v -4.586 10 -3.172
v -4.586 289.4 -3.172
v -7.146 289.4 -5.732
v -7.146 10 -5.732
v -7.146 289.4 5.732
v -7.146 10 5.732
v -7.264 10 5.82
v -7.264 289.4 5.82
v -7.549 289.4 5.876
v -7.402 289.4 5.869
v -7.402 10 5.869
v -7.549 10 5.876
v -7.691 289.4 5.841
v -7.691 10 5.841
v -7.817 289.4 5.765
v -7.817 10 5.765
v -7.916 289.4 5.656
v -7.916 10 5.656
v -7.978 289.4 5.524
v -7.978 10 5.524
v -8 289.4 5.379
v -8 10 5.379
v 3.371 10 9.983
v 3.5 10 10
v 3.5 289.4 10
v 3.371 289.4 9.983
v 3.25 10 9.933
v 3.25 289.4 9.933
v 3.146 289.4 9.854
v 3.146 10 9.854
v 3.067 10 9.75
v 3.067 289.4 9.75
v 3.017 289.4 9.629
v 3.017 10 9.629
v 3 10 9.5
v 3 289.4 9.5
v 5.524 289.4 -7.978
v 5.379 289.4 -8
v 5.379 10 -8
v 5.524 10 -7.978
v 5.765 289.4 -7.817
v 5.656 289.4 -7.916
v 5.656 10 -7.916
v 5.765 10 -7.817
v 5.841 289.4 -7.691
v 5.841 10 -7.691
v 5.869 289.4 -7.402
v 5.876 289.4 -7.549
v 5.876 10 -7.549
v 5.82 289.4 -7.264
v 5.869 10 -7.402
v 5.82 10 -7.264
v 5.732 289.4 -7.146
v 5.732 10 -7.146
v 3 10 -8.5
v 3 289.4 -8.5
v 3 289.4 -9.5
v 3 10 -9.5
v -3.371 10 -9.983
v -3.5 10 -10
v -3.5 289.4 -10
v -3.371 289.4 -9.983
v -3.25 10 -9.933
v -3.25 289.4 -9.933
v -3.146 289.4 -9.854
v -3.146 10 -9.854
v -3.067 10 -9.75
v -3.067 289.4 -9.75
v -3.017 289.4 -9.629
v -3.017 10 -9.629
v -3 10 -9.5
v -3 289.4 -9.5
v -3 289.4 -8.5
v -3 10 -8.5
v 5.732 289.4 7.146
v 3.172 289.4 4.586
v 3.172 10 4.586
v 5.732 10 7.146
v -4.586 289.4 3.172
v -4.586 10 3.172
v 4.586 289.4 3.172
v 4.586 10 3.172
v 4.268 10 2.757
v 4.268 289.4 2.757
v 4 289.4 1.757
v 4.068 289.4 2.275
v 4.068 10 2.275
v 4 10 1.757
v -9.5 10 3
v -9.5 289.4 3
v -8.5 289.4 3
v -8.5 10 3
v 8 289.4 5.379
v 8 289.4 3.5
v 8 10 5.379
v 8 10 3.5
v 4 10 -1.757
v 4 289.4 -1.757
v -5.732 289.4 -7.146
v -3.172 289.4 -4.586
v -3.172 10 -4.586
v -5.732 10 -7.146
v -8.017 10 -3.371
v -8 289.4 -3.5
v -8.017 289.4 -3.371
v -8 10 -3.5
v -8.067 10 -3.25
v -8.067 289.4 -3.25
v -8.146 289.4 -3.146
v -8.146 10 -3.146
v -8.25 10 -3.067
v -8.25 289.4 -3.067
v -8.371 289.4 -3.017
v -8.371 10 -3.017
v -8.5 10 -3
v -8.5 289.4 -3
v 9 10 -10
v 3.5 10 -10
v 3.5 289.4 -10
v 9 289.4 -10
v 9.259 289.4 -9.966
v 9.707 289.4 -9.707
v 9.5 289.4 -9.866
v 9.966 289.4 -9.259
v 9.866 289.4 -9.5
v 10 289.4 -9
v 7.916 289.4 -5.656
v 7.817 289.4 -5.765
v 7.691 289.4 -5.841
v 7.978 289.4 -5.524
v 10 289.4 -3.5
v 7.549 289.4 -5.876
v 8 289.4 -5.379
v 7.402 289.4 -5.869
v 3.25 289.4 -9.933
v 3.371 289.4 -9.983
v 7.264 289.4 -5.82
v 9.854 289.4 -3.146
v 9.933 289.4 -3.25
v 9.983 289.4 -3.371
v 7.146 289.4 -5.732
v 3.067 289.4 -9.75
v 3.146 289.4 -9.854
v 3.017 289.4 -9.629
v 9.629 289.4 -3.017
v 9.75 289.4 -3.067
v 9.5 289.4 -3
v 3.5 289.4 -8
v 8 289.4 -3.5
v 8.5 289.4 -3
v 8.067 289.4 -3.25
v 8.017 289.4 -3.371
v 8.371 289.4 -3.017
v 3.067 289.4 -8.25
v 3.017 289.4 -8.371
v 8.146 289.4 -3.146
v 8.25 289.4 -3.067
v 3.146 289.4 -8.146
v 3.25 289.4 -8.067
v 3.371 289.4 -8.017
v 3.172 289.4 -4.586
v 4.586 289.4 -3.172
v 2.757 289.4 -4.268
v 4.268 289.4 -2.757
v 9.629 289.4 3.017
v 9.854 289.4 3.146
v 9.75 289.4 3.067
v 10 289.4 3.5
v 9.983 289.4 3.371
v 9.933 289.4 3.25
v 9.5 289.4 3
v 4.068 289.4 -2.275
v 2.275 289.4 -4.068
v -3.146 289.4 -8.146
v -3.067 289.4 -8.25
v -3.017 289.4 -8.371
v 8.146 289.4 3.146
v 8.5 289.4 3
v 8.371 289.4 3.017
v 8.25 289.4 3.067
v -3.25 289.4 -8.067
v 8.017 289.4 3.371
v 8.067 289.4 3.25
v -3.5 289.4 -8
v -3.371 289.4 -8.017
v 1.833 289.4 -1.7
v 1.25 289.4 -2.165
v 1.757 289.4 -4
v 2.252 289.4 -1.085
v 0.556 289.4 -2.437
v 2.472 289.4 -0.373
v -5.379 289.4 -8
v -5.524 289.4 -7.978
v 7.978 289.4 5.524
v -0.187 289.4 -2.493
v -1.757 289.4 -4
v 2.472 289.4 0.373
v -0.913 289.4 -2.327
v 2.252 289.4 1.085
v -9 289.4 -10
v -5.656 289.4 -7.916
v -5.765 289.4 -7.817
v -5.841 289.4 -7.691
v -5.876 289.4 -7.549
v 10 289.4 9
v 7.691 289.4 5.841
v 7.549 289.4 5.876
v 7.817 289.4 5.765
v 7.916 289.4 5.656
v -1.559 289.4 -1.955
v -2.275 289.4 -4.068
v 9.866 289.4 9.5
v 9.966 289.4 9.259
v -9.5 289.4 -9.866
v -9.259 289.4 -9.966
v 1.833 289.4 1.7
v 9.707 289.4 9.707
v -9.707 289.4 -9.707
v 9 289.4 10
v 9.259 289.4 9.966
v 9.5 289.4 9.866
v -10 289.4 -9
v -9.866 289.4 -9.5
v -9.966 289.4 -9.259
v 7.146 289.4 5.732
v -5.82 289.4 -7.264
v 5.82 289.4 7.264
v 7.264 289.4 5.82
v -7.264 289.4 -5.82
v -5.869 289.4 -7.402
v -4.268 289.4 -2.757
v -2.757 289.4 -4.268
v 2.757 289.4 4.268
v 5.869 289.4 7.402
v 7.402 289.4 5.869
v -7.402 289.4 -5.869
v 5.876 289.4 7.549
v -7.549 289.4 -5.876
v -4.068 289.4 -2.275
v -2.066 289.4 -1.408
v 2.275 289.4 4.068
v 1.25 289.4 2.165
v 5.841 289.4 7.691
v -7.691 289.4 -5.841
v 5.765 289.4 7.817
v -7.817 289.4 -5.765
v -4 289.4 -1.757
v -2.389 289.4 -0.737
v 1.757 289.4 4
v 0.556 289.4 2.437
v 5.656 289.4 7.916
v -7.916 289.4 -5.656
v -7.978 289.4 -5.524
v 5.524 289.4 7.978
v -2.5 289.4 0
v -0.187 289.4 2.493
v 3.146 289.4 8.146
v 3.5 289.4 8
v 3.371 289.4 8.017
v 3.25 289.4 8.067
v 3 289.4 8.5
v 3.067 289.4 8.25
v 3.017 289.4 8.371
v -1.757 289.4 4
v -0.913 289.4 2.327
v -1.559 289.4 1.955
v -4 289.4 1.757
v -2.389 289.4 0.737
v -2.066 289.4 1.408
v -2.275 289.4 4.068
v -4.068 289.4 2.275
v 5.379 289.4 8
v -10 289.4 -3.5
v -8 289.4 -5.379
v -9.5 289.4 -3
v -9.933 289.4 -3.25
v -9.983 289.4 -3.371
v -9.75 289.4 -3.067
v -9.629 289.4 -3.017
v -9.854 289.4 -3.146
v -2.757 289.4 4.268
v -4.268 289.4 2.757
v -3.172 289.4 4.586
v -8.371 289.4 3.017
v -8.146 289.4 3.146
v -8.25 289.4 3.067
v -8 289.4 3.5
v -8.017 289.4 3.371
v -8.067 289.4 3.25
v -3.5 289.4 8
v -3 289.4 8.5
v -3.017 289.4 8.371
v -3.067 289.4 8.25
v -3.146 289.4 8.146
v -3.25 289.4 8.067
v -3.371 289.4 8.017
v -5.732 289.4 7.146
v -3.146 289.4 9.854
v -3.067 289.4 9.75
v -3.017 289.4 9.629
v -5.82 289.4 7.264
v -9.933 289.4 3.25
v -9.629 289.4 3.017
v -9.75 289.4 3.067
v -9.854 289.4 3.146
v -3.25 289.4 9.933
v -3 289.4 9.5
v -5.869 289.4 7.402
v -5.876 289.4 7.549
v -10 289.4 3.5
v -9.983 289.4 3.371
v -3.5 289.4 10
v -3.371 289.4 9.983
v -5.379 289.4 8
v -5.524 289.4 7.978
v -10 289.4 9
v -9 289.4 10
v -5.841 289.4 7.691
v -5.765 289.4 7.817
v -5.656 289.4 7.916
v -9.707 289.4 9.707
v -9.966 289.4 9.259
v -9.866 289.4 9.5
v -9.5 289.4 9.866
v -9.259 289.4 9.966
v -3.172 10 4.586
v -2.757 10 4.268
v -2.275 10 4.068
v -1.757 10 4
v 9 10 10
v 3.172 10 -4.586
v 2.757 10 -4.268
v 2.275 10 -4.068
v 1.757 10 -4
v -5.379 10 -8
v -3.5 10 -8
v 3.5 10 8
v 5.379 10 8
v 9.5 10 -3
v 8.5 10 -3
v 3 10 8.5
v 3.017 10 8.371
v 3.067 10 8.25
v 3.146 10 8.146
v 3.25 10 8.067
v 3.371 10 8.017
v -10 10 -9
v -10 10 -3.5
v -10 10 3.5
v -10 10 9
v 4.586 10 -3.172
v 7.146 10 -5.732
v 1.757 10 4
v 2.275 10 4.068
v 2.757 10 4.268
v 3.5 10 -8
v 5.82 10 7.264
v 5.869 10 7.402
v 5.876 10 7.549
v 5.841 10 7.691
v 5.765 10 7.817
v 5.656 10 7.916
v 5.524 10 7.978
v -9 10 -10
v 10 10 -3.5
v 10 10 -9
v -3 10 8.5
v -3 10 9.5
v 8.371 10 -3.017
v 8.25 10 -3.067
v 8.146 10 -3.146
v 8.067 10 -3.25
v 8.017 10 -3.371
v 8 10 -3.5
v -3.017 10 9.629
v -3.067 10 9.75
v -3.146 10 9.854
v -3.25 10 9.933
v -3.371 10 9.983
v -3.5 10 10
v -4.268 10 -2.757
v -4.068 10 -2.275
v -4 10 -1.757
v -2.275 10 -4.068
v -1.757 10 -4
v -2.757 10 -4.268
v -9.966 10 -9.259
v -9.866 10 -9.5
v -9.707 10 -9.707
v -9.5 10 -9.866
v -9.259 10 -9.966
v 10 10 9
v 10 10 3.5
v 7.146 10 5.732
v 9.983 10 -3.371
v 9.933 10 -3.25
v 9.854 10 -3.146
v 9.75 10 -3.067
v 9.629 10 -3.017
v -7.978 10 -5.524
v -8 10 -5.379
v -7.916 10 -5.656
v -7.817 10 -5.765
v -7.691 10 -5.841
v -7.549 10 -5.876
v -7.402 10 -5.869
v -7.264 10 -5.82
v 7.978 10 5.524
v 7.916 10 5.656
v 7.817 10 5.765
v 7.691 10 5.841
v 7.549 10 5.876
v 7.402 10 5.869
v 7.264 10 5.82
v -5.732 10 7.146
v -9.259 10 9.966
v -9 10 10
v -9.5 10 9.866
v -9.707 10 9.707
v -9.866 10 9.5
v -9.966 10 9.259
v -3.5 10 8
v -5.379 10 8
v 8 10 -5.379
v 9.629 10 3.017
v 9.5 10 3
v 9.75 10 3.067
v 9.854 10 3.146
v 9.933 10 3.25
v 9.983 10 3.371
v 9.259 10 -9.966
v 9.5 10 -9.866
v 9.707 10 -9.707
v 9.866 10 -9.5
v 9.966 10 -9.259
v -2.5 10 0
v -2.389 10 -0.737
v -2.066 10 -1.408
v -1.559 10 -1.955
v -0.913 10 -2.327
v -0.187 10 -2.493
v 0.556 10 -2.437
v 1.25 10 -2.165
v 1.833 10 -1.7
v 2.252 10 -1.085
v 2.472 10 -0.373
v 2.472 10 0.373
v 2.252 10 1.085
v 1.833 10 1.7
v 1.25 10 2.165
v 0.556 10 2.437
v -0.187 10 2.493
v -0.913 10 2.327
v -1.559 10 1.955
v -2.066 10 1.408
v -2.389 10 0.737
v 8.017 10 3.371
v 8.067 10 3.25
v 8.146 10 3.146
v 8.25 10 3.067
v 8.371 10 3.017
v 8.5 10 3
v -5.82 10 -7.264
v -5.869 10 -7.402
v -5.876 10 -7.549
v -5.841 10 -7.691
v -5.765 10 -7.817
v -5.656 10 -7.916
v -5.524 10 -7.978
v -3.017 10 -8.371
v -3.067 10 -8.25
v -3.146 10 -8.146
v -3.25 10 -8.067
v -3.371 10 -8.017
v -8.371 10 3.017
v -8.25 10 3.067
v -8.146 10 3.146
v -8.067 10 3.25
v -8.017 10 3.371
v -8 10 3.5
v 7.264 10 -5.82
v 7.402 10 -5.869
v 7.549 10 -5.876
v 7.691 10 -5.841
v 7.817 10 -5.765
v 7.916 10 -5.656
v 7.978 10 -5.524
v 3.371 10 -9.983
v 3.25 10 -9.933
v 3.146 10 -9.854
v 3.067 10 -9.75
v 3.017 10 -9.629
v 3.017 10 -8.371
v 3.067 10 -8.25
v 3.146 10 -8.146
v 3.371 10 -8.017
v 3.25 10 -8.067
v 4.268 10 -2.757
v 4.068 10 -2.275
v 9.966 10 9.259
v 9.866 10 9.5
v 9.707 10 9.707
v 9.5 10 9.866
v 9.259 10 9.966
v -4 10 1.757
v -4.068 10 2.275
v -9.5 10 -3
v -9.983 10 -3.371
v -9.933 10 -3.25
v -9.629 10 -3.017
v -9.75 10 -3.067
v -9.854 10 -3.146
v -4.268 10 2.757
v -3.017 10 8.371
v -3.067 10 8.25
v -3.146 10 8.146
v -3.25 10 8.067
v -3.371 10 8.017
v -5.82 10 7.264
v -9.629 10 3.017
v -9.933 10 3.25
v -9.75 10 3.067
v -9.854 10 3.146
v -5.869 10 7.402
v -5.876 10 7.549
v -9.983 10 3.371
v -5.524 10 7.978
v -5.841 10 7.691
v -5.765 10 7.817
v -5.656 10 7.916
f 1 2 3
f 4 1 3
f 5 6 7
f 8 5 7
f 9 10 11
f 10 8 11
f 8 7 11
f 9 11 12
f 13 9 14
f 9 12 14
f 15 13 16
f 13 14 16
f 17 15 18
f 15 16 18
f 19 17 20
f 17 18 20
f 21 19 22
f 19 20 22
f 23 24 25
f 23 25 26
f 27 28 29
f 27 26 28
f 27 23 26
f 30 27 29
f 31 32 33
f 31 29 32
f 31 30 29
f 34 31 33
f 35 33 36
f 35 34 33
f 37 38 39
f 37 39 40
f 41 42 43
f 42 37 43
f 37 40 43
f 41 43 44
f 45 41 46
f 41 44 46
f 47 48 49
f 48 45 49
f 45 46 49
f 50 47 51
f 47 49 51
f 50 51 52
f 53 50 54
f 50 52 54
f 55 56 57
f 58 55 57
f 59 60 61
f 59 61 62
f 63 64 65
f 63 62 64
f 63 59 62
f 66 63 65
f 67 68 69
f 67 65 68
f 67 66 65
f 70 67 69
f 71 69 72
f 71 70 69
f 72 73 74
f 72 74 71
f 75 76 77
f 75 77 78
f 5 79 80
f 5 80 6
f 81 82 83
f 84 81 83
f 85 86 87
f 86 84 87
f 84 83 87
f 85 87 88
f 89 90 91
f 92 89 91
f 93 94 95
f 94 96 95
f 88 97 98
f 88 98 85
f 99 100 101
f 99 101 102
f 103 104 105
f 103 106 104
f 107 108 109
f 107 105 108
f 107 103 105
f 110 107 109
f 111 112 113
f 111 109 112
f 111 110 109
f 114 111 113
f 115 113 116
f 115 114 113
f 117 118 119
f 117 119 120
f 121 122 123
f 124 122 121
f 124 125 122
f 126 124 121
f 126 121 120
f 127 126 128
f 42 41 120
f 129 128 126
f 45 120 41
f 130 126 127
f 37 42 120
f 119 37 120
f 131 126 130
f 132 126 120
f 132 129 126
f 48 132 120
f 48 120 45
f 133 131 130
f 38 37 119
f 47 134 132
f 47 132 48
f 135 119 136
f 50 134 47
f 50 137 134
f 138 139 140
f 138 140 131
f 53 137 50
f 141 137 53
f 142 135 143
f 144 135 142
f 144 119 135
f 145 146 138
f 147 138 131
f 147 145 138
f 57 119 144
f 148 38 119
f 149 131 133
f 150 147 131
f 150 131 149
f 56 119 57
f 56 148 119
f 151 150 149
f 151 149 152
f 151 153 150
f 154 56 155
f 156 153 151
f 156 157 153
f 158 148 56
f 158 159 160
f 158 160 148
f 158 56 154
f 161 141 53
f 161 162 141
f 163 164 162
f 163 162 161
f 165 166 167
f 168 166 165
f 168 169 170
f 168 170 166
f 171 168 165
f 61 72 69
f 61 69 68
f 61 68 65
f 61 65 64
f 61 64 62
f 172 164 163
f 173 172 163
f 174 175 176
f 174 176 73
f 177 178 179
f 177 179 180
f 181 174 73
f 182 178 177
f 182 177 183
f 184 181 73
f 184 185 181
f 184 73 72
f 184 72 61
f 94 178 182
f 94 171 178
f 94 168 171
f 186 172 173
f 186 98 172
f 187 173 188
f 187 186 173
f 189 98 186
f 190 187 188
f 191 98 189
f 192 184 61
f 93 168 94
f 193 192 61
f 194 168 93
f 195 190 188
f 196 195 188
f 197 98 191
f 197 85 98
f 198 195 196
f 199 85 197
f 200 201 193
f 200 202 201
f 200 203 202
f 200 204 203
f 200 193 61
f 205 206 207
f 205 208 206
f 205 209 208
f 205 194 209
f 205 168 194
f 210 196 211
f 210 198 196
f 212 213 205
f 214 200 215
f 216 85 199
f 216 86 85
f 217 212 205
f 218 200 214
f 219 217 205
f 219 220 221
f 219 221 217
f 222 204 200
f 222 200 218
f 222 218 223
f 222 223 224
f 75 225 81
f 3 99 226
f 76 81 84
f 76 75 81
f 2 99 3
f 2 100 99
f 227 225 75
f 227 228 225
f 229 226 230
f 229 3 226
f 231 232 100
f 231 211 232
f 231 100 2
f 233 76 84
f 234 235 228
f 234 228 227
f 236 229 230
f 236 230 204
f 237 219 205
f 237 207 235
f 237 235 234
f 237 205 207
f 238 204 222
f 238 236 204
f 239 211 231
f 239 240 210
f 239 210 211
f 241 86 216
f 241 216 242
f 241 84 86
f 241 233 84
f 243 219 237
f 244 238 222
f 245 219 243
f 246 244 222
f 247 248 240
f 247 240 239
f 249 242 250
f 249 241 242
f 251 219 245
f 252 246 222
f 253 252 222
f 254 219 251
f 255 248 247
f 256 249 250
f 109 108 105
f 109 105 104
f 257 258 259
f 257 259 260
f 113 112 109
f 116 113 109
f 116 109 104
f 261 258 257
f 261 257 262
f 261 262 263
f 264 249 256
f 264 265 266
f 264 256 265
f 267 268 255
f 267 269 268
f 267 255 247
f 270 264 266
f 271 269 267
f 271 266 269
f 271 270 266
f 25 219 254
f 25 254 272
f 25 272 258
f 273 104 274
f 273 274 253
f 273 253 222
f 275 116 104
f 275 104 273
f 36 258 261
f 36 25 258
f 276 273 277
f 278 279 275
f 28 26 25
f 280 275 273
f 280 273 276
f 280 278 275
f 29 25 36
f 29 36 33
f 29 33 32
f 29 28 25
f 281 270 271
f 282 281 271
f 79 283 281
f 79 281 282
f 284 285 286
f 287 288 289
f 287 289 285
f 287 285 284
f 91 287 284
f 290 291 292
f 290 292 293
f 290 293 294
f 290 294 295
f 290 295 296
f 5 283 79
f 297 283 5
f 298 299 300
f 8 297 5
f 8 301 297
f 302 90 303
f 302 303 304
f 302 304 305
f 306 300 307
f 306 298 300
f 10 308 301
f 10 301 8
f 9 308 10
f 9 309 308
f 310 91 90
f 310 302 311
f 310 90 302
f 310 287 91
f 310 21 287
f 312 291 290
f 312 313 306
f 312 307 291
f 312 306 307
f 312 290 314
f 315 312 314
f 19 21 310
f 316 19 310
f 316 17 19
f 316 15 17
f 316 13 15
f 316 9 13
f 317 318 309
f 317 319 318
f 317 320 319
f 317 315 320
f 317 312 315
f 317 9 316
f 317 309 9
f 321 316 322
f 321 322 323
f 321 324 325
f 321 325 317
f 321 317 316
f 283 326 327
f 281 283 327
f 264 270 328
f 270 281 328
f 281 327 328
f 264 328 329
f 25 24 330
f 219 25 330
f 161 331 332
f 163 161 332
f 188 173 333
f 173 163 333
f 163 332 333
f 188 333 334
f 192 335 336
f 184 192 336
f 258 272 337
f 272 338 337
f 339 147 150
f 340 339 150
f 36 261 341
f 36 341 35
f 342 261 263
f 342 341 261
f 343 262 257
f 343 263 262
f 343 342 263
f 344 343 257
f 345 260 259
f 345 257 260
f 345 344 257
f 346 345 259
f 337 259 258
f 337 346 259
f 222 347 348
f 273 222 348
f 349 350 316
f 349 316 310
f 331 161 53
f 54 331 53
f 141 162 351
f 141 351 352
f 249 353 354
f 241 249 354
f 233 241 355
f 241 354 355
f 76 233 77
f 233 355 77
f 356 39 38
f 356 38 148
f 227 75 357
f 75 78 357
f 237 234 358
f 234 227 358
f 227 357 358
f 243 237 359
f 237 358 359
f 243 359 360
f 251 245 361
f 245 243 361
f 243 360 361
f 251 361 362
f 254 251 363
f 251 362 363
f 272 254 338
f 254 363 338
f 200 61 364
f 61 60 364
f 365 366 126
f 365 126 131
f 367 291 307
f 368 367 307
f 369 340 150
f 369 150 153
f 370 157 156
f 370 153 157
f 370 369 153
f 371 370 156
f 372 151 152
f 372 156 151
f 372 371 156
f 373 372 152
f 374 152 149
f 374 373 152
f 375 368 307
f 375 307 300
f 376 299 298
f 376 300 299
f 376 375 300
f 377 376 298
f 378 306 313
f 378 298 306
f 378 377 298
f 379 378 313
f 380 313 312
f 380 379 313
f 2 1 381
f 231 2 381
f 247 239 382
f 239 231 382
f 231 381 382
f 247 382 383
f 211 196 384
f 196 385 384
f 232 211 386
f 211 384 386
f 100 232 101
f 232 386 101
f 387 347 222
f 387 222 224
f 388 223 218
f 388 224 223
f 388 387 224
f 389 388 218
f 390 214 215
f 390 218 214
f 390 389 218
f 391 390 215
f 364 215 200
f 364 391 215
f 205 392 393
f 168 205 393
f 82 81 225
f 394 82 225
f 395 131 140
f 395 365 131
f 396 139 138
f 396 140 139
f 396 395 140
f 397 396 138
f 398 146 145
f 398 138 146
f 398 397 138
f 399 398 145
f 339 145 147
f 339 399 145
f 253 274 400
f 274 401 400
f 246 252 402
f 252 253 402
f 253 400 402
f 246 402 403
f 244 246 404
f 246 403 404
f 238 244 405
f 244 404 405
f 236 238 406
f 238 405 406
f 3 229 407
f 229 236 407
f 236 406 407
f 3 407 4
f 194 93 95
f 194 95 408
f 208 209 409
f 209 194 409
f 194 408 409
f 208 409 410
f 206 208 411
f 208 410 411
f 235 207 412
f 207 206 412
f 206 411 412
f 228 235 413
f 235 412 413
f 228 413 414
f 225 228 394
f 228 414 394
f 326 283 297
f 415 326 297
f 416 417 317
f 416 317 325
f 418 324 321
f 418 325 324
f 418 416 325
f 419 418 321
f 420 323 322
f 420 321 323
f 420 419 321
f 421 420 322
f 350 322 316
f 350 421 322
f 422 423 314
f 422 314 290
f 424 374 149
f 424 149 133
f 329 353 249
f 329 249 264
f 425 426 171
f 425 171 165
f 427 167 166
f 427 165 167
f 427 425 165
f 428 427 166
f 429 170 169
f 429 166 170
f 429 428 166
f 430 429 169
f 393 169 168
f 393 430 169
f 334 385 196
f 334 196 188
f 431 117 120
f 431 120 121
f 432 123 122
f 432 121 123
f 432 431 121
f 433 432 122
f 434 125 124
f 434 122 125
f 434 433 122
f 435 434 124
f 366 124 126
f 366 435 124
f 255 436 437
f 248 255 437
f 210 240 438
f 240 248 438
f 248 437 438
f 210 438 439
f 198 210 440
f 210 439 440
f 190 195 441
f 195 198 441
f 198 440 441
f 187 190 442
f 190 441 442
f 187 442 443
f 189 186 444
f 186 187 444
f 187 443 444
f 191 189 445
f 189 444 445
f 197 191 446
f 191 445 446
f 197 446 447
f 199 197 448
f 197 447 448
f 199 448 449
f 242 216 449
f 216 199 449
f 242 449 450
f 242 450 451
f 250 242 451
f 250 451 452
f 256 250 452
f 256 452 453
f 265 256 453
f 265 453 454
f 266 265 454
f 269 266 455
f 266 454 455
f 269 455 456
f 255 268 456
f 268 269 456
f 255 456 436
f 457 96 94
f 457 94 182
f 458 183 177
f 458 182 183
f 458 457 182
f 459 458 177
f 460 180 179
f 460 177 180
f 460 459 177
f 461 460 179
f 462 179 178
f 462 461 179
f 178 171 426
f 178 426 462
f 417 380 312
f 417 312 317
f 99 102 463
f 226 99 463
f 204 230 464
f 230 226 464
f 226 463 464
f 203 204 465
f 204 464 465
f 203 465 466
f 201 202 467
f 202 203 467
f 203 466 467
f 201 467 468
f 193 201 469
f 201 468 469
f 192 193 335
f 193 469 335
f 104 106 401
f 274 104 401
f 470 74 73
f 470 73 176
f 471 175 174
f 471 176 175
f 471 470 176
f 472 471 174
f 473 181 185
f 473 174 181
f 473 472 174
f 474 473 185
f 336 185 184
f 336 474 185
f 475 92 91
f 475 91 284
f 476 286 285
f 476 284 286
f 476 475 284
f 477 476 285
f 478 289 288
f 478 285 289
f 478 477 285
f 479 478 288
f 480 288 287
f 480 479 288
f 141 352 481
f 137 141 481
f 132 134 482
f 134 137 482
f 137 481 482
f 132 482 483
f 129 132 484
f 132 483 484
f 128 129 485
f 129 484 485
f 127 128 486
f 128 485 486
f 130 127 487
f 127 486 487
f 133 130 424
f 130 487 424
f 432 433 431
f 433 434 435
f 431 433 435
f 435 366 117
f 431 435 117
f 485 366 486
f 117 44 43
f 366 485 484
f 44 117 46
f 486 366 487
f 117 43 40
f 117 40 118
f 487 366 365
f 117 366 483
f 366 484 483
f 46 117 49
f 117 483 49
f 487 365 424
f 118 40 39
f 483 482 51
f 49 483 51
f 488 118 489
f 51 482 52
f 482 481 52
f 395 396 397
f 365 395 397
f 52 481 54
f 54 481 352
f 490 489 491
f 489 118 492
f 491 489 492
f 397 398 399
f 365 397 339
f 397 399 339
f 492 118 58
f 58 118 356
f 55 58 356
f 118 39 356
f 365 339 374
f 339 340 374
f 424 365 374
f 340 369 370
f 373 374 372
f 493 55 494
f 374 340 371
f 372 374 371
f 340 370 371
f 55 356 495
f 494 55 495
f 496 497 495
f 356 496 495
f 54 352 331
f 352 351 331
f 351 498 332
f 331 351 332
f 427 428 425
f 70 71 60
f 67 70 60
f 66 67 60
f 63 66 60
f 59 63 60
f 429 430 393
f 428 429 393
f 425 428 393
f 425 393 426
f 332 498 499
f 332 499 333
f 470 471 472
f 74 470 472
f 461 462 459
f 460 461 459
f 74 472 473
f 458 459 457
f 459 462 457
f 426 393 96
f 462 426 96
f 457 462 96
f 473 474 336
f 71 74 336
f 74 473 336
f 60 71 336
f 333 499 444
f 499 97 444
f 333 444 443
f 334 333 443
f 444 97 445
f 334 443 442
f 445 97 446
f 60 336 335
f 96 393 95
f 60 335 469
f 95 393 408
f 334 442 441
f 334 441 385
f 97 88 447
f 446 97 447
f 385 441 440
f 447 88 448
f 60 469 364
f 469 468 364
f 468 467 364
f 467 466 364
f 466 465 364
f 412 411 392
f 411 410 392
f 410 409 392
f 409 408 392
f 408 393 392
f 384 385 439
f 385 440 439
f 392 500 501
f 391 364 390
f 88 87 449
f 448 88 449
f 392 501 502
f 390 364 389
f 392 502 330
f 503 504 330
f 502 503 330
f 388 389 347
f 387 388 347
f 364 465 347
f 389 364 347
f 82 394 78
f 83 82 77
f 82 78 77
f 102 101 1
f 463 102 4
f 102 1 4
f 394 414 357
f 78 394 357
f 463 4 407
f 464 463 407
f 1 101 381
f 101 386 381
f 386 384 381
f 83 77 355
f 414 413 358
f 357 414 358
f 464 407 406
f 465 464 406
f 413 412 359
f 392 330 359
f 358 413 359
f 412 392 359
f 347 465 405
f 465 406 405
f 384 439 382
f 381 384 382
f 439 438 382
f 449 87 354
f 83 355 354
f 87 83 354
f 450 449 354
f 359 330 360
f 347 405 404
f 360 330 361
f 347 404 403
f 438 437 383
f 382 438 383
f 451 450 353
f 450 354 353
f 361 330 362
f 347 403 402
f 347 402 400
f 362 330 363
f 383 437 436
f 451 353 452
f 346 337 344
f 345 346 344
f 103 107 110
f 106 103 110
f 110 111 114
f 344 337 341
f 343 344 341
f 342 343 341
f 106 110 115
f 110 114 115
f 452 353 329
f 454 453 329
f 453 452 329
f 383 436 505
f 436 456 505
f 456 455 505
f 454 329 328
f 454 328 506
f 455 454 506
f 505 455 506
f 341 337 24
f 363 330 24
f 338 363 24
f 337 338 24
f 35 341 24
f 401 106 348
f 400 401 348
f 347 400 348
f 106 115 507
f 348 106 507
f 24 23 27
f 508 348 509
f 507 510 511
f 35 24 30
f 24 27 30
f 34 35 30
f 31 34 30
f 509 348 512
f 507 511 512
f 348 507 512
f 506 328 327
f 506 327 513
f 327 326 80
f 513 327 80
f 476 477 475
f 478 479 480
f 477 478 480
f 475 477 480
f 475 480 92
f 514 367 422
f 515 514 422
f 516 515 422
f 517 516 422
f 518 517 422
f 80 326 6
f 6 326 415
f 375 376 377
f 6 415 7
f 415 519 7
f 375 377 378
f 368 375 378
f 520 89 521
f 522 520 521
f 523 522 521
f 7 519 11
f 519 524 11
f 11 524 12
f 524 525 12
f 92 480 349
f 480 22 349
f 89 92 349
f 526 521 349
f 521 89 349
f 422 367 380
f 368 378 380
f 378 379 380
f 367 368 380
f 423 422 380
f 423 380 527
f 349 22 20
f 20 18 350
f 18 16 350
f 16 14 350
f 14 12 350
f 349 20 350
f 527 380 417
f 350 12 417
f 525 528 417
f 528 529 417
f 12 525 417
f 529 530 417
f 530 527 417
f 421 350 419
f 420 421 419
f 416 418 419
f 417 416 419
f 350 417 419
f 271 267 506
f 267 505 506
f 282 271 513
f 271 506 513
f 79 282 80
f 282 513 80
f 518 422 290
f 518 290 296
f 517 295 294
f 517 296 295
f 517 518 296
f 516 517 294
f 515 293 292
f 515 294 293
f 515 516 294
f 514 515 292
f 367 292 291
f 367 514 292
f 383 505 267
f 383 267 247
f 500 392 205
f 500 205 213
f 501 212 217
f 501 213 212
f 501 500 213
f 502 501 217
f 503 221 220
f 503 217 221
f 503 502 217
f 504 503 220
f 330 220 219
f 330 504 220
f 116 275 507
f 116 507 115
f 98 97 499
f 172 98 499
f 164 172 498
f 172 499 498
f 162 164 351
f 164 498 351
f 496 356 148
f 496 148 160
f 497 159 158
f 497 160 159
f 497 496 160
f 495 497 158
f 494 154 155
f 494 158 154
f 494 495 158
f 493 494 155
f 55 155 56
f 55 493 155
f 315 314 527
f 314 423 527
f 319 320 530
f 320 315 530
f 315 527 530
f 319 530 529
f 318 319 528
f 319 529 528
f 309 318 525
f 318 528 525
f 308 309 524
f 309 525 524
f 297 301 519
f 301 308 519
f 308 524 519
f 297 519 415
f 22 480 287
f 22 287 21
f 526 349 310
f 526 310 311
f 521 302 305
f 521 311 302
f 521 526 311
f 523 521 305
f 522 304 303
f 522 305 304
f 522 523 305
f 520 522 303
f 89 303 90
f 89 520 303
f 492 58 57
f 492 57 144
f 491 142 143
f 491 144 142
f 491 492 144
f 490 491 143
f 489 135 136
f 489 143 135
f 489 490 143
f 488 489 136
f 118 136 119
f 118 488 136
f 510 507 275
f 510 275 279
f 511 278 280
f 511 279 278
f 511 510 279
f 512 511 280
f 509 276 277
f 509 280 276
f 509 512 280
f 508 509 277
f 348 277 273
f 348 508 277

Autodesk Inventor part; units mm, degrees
ref_plane "Start Plane" through (0, 10, 0) normal (0, 1, 0) x (-1, 0, 0)
ref_plane "End Plane" through (0, 289.4, 0) normal (0, 1, 0) x (-1, 0, 0)
sketch "Sketch" plane through (0, 0, 0) normal (0, 1, 0) x (-1, 0, 0)
  line L0 (-1.7574, 4) -> (1.7574, 4)
  line L1 (4, 1.7574) -> (4, -1.7574)
  line L2 (1.7574, -4) -> (-1.7574, -4)
  line L3 (-4, -1.7574) -> (-4, 1.7574)
  line L4 (4.5858, -3.1716) -> (7.1464, -5.7322)
  line L5 (3.1716, -4.5858) -> (5.7322, -7.1464)
  line L6 (5.3787, -8) -> (3.5, -8)
  line L7 (3, -8.5) -> (3, -9.5)
  line L8 (3.5, -10) -> (9, -10)
  line L9 (10, -9) -> (10, -3.5)
  line L10 (9.5, -3) -> (8.5, -3)
  line L11 (8, -3.5) -> (8, -5.3787)
  line L12 (4, 0) -> (-4, 0) construction
  line L13 (0, -4) -> (0, 4) construction
  arc A0 (4, -1.7574) -> (4.5858, -3.1716) centre (6, -1.7574) ccw
  arc A1 (3.1716, -4.5858) -> (1.7574, -4) centre (1.7574, -6) ccw
  arc A2 (3.5, -8) -> (3, -8.5) centre (3.5, -8.5) ccw
  arc A3 (3, -9.5) -> (3.5, -10) centre (3.5, -9.5) ccw
  arc A4 (10, -3.5) -> (9.5, -3) centre (9.5, -3.5) ccw
  arc A5 (8.5, -3) -> (8, -3.5) centre (8.5, -3.5) ccw
  arc A6 (7.1464, -5.7322) -> (8, -5.3787) centre (7.5, -5.3787) ccw
  arc A7 (5.3787, -8) -> (5.7322, -7.1464) centre (5.3787, -7.5) ccw
  arc A8 (9, -10) -> (10, -9) centre (9, -9) ccw
  line L14 (-4.5858, -3.1716) -> (-7.1464, -5.7322)
  line L15 (-3.1716, -4.5858) -> (-5.7322, -7.1464)
  line L16 (-5.3787, -8) -> (-3.5, -8)
  line L17 (-3, -8.5) -> (-3, -9.5)
  line L18 (-3.5, -10) -> (-9, -10)
  line L19 (-10, -9) -> (-10, -3.5)
  line L20 (-9.5, -3) -> (-8.5, -3)
  line L21 (-8, -3.5) -> (-8, -5.3787)
  arc A9 (-4.5858, -3.1716) -> (-4, -1.7574) centre (-6, -1.7574) ccw
  arc A10 (-1.7574, -4) -> (-3.1716, -4.5858) centre (-1.7574, -6) ccw
  arc A11 (-3, -8.5) -> (-3.5, -8) centre (-3.5, -8.5) ccw
  arc A12 (-3.5, -10) -> (-3, -9.5) centre (-3.5, -9.5) ccw
  arc A13 (-9.5, -3) -> (-10, -3.5) centre (-9.5, -3.5) ccw
  arc A14 (-8, -3.5) -> (-8.5, -3) centre (-8.5, -3.5) ccw
  arc A15 (-8, -5.3787) -> (-7.1464, -5.7322) centre (-7.5, -5.3787) ccw
  arc A16 (-5.7322, -7.1464) -> (-5.3787, -8) centre (-5.3787, -7.5) ccw
  arc A17 (-10, -9) -> (-9, -10) centre (-9, -9) ccw
  line L22 (4.5858, 3.1716) -> (7.1464, 5.7322)
  line L23 (3.1716, 4.5858) -> (5.7322, 7.1464)
  line L24 (5.3787, 8) -> (3.5, 8)
  line L25 (3, 8.5) -> (3, 9.5)
  line L26 (3.5, 10) -> (9, 10)
  line L27 (10, 9) -> (10, 3.5)
  line L28 (9.5, 3) -> (8.5, 3)
  line L29 (8, 3.5) -> (8, 5.3787)
  arc A18 (4.5858, 3.1716) -> (4, 1.7574) centre (6, 1.7574) ccw
  arc A19 (1.7574, 4) -> (3.1716, 4.5858) centre (1.7574, 6) ccw
  arc A20 (3, 8.5) -> (3.5, 8) centre (3.5, 8.5) ccw
  arc A21 (3.5, 10) -> (3, 9.5) centre (3.5, 9.5) ccw
  arc A22 (9.5, 3) -> (10, 3.5) centre (9.5, 3.5) ccw
  arc A23 (8, 3.5) -> (8.5, 3) centre (8.5, 3.5) ccw
  arc A24 (8, 5.3787) -> (7.1464, 5.7322) centre (7.5, 5.3787) ccw
  arc A25 (5.7322, 7.1464) -> (5.3787, 8) centre (5.3787, 7.5) ccw
  arc A26 (10, 9) -> (9, 10) centre (9, 9) ccw
  line L30 (-10, 9) -> (-10, 3.5)
  arc A27 (-9, 10) -> (-10, 9) centre (-9, 9) ccw
  arc A28 (-10, 3.5) -> (-9.5, 3) centre (-9.5, 3.5) ccw
  line L31 (-9.5, 3) -> (-8.5, 3)
  arc A29 (-8.5, 3) -> (-8, 3.5) centre (-8.5, 3.5) ccw
  line L32 (-8, 3.5) -> (-8, 5.3787)
  arc A30 (-7.1464, 5.7322) -> (-8, 5.3787) centre (-7.5, 5.3787) ccw
  line L33 (-4.5858, 3.1716) -> (-7.1464, 5.7322)
  line L34 (-3.1716, 4.5858) -> (-5.7322, 7.1464)
  arc A31 (-3.1716, 4.5858) -> (-1.7574, 4) centre (-1.7574, 6) ccw
  arc A32 (-4, 1.7574) -> (-4.5858, 3.1716) centre (-6, 1.7574) ccw
  arc A33 (-5.3787, 8) -> (-5.7322, 7.1464) centre (-5.3787, 7.5) ccw
  line L35 (-5.3787, 8) -> (-3.5, 8)
  arc A34 (-3.5, 8) -> (-3, 8.5) centre (-3.5, 8.5) ccw
  line L36 (-3, 8.5) -> (-3, 9.5)
  arc A35 (-3, 9.5) -> (-3.5, 10) centre (-3.5, 9.5) ccw
  line L37 (-3.5, 10) -> (-9, 10)
  circle A36 centre (0, 0) radius 2.5
  point P0 (3, -8)
  point P1 (3, -10)
  point P2 (10, -10)
  dimension "d3" = 2
  dimension "d4" = 2
  dimension "d5" = 7
  dimension "d6" = 2
  dimension "d7" = 0.5
  dimension "d8" = 1
  dimension "d9" = 20
  dimension "d10" = 20
  dimension "d11" = 8
  dimension "d13" = 5
  dimension "d14" = 8
extrude "Body" add sketch "Sketch" along normal up to surface (279.4 mm away) from surface at 10
sketch "Sketch4" plane through (0, 0, 0) normal (0, 1, 0) x (-1, 0, 0)
  line L0 (0, 0) -> (10, 0)
ref_plane "Work Plane4" through (0, 0, 0) normal (0, 0, -1) x (-1, 0, 0)
sketch "Sketch5" plane through (0, 0, 0) normal (0, 0, -1) x (-1, 0, 0)
  line L0 (-2, 10) -> (12, 10)
  line L1 (-2, 289.4) -> (12, 289.4)
  dimension "d22" = 279.4
ref_plane "Work Plane5" through (9, 10, -660.4) normal (0, -1, 0) x (1, 0, 0)
split "Split1" plane through (9, 10, -660.4) removes the side toward (0, -1, 0)
ref_plane "Work Plane6" through (0, 289.4, 9) normal (0, 1, 0) x (1, 0, 0)
split "Split2" plane through (0, 289.4, 9) removes the side toward (0, 1, 0)
equation "\"d18\" = Length + G_OFFSET_END"
equation "\"G_L\" = d22"
equation "\"Length\" = 279.4"
equation "\"G_OFFSET_END\" = 10"
properties part number "A3.3"
